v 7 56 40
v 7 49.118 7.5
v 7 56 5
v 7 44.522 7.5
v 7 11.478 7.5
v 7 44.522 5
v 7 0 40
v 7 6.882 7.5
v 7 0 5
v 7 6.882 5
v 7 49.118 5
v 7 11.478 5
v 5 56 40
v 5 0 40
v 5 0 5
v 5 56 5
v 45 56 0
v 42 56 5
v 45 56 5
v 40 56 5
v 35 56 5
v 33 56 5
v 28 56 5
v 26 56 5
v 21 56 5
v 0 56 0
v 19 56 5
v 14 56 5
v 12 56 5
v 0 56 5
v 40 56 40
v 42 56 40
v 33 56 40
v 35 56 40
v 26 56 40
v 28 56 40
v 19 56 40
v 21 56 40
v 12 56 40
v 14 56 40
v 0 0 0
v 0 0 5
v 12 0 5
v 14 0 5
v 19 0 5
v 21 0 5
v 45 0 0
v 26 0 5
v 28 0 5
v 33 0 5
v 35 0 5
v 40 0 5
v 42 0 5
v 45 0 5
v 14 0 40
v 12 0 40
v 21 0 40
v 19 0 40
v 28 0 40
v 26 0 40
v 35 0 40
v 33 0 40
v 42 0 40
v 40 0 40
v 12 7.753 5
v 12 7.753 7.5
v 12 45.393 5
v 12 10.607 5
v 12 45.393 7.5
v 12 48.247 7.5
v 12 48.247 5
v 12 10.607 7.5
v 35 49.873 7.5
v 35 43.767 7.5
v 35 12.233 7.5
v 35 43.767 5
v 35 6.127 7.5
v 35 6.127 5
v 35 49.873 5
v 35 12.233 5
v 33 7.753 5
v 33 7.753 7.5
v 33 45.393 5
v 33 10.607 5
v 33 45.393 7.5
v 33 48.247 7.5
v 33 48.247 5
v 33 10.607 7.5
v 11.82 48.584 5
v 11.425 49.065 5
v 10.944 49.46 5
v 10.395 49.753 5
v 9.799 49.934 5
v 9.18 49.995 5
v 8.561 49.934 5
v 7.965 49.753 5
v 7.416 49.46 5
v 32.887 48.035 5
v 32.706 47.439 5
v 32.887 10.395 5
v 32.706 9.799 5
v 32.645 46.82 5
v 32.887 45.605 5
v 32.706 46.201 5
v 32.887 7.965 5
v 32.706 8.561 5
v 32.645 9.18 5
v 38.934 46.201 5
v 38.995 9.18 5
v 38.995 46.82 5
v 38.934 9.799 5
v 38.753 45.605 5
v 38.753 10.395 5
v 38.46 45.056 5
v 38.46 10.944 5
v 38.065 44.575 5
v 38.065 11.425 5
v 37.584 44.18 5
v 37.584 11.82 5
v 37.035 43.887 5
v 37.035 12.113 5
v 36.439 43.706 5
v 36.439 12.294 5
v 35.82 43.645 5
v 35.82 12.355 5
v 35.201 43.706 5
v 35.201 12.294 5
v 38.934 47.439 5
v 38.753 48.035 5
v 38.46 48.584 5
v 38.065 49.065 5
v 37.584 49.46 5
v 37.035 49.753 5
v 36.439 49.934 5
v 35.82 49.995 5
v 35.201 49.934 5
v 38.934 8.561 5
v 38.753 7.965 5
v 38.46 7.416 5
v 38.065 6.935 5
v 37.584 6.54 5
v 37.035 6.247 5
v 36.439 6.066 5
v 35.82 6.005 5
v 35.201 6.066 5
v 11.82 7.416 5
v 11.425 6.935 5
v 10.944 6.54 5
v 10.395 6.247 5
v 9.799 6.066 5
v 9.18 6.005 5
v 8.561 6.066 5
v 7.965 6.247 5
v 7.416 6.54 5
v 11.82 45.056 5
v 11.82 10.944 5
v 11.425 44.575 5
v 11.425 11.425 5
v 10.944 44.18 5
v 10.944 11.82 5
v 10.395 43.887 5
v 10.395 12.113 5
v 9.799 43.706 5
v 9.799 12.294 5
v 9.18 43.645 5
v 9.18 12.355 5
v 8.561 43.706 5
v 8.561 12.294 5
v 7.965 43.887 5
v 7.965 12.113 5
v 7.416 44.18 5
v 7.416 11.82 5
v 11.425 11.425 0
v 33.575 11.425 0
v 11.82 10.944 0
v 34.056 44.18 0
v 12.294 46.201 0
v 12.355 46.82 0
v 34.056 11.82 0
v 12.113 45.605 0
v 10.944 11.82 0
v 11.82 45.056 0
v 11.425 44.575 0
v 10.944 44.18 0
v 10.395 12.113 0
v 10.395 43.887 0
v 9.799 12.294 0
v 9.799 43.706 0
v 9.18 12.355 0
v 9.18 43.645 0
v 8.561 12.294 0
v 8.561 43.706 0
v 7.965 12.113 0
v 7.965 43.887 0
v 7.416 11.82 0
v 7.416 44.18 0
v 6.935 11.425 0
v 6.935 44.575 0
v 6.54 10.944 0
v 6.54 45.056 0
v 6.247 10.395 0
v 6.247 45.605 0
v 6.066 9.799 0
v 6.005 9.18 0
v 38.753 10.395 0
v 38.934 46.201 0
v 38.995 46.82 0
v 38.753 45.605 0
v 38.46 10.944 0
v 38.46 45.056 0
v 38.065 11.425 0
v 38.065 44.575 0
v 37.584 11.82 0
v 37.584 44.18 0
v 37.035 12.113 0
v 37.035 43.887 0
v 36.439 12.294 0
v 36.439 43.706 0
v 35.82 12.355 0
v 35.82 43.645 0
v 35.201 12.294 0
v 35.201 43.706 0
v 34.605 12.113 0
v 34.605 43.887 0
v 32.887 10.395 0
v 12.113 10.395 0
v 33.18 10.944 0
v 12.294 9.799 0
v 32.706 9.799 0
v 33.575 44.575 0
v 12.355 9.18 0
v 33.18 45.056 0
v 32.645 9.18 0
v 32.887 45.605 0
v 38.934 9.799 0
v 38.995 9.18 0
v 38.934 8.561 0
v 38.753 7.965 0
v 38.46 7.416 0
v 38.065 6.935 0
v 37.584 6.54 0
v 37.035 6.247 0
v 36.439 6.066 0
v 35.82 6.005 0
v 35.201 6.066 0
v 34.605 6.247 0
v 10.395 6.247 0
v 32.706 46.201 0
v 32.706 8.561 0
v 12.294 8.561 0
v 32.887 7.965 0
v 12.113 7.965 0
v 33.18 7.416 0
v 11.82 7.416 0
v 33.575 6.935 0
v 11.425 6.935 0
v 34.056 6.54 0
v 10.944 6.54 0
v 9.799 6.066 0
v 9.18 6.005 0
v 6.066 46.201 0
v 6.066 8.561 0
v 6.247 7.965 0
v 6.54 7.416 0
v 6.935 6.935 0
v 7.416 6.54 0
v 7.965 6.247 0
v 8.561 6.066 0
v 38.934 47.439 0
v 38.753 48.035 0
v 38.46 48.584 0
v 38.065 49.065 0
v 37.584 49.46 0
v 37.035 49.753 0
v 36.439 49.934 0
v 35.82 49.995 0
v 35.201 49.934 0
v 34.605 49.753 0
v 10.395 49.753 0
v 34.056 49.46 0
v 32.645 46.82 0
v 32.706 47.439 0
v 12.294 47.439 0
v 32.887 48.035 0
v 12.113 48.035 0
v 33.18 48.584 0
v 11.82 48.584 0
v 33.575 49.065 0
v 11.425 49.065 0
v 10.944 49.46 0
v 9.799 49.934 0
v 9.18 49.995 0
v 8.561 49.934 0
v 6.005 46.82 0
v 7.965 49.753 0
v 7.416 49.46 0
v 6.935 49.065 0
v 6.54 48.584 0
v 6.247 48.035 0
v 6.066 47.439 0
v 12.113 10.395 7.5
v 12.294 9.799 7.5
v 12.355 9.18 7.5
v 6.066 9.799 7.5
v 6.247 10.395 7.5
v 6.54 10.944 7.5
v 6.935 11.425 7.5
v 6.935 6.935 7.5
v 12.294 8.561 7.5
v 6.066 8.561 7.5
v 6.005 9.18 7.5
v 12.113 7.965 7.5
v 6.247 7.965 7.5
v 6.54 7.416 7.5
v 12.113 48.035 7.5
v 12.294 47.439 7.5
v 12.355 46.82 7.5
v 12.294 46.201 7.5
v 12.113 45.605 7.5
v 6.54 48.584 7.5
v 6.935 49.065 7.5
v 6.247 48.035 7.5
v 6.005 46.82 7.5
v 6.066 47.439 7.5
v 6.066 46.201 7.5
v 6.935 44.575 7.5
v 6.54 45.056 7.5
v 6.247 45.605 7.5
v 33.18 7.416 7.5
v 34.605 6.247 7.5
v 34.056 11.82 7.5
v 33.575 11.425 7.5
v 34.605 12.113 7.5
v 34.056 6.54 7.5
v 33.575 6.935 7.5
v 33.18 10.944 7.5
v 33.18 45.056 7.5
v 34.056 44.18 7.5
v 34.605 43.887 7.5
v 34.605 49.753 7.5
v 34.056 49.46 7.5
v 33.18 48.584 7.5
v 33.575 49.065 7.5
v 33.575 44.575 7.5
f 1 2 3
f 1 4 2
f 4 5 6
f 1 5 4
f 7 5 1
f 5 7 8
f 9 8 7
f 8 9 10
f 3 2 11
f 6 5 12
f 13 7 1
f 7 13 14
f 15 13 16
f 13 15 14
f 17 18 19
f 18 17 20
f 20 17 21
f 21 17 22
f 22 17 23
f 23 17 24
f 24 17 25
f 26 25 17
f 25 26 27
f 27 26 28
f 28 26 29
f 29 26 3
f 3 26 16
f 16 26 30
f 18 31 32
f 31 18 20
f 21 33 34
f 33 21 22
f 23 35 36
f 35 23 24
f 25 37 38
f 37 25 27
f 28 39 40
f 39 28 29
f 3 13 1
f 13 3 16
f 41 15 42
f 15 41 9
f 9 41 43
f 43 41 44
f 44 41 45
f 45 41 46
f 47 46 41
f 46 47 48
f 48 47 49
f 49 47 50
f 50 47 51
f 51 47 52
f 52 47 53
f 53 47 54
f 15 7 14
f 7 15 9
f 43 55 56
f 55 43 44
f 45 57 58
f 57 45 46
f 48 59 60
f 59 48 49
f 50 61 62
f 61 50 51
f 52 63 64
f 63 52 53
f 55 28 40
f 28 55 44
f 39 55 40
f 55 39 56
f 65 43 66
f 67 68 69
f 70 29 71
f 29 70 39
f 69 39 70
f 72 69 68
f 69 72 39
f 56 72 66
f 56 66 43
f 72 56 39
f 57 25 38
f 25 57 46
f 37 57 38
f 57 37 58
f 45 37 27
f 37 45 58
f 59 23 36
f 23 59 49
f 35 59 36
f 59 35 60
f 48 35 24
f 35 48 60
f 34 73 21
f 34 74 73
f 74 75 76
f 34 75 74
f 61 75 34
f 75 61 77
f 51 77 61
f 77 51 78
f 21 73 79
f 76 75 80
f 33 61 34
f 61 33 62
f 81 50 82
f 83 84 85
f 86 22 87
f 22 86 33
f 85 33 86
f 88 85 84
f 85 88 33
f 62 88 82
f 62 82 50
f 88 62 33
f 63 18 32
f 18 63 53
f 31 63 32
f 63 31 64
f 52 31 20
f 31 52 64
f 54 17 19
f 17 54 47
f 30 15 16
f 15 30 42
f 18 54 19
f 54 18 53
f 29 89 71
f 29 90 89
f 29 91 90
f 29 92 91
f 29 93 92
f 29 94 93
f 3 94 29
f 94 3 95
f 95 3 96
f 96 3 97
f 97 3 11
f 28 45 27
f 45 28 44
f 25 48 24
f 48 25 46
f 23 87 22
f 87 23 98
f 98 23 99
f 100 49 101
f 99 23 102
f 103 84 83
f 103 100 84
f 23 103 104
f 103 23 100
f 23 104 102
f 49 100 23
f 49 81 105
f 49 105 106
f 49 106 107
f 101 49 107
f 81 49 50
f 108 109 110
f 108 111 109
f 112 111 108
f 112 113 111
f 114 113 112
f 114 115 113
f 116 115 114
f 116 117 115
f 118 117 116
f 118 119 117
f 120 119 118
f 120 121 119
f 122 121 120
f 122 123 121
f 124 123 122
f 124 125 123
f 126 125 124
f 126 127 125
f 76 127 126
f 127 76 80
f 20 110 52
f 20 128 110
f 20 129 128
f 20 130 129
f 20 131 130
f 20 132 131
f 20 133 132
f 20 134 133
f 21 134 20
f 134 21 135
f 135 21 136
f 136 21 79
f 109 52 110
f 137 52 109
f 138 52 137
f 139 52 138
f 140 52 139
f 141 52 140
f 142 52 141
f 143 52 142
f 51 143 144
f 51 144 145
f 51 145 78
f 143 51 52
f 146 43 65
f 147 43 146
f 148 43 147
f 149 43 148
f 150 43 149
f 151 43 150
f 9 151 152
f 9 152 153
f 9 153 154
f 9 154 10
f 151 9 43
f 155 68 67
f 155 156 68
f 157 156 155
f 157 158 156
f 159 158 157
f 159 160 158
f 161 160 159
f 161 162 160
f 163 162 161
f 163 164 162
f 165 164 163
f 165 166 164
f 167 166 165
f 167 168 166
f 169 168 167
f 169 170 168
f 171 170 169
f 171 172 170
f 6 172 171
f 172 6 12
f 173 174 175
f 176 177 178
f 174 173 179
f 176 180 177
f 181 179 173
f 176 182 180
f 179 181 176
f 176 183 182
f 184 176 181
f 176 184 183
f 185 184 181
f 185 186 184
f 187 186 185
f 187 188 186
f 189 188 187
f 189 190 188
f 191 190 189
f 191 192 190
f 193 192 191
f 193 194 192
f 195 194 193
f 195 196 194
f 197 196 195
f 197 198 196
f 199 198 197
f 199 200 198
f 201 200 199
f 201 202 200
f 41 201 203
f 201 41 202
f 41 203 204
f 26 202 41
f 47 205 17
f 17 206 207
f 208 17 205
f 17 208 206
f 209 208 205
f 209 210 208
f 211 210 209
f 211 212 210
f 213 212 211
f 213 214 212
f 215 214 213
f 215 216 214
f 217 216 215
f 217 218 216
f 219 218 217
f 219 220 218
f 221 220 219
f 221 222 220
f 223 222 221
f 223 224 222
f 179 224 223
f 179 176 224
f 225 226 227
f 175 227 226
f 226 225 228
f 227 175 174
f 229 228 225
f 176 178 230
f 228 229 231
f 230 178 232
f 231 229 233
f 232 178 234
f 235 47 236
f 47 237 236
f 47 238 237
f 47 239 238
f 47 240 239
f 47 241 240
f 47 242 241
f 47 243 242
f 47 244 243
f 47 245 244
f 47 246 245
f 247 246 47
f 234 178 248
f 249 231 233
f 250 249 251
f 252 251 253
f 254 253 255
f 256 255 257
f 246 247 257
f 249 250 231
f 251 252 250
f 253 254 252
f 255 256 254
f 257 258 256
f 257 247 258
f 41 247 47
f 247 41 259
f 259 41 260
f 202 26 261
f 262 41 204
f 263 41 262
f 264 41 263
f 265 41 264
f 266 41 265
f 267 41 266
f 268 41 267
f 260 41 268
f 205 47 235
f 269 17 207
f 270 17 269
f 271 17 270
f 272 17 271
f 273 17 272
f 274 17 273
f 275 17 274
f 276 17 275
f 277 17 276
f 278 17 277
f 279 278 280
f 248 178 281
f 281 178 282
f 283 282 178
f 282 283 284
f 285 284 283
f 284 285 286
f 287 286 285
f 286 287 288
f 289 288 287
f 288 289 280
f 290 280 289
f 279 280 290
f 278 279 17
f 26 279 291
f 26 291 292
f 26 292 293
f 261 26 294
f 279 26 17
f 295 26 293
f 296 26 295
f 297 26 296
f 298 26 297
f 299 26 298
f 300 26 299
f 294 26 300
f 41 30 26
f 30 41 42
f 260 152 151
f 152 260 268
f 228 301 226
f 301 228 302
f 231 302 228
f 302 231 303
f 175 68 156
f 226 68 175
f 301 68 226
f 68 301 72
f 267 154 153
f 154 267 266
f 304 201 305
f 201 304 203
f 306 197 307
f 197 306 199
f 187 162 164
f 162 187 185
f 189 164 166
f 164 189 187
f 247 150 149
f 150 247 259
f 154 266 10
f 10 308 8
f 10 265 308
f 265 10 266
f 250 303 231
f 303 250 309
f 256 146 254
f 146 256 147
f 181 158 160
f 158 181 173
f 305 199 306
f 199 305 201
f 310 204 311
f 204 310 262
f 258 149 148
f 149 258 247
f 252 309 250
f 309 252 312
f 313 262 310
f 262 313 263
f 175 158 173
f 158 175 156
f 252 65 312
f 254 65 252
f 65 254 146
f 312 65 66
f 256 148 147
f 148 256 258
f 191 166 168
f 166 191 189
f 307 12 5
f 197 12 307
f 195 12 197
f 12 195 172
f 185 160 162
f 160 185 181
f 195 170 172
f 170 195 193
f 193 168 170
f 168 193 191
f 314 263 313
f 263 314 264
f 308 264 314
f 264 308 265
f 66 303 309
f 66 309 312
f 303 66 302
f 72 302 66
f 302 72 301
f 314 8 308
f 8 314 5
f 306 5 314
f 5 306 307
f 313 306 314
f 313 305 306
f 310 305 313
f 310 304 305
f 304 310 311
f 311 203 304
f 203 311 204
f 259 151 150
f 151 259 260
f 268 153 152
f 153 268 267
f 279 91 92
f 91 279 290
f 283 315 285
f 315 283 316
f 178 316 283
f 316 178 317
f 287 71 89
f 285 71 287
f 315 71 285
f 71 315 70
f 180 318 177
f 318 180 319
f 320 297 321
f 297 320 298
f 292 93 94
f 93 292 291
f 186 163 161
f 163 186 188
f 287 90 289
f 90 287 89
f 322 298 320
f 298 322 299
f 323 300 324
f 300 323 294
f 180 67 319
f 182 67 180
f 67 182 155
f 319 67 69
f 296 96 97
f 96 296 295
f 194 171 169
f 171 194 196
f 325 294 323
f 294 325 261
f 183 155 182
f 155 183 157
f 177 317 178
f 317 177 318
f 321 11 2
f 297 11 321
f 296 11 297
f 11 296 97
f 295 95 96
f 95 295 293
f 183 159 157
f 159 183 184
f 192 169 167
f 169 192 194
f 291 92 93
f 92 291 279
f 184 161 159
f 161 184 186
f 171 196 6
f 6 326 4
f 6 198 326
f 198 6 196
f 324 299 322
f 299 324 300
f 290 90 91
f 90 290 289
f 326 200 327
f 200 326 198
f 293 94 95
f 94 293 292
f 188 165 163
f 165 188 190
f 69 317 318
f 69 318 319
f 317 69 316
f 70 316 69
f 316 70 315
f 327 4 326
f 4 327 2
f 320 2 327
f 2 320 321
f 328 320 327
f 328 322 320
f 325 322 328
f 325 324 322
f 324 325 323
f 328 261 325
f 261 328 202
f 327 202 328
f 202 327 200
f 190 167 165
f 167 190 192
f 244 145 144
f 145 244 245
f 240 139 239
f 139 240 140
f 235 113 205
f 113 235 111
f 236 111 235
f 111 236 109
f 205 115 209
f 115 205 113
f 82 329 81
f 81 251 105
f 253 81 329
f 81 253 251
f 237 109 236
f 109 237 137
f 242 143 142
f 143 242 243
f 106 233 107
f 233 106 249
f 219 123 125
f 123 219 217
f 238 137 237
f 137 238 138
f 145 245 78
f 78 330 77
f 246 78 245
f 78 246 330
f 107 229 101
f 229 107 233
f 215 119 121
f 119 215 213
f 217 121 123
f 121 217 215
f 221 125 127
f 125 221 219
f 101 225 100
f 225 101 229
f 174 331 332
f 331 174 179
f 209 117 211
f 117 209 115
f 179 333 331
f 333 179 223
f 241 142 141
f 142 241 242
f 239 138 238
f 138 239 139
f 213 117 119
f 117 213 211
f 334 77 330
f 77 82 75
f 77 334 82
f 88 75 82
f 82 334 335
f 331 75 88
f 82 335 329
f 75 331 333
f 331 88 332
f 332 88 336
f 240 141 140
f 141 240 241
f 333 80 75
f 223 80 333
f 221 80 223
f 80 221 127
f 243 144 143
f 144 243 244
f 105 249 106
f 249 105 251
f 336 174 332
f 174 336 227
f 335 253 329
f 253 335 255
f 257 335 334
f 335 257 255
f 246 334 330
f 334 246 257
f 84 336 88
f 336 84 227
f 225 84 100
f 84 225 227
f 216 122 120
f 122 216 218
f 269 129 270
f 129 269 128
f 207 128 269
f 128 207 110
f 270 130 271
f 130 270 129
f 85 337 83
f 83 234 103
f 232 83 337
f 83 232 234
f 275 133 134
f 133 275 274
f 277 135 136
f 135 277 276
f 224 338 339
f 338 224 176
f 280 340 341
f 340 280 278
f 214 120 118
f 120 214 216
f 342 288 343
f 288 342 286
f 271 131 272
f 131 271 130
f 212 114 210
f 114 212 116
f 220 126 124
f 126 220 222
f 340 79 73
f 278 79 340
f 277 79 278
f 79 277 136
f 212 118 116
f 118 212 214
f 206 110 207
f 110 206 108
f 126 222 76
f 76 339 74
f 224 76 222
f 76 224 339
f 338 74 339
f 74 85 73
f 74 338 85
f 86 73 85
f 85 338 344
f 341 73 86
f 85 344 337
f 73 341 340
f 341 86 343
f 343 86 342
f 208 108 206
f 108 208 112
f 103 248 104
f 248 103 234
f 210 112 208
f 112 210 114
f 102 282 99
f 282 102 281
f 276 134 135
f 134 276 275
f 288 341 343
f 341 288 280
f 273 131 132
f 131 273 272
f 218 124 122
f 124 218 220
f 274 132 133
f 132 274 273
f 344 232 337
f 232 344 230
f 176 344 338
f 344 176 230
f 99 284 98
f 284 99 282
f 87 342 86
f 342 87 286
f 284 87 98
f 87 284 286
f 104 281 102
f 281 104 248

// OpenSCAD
$fn = 32;

// ----------------------------------------------------------------------
// Finned heat sink: 45 x 56 mm base, 35 mm fins
// ----------------------------------------------------------------------

// --- parameters (mm) ---
base_w = 45;              // base width
base_d = 56;              // base depth
base_t = 5;               // base thickness
fin_h = 35;               // fin height above the base
holes_d = 6.35;           // fixing holes
hole_x = 13.32;           // hole offset in x
hole_y = 18.82;           // hole offset in y
fin_t = 2;                // fin thickness
fin_pitch = 7;            // fin pitch
fin_count = 6;            // number of fins
fin_x0 = 5;               // first fin offset

difference() {
  union() {
    cube([base_w, base_d, base_t]);
    for (i = [0 : fin_count - 1]) {
      translate([fin_x0 + i * fin_pitch, 0, base_t - 0.5]) cube([fin_t, base_d, fin_h + 0.5]);
    }
  }
  /* fixing holes through the base, 2.5 mm clear on both sides */
  for (hx = [-13.32, 13.32]) {
    for (hy = [-18.82, 18.82]) {
      translate([base_w / 2 + hx, base_d / 2 + hy, -2.5]) cylinder(h = base_t + 5, d = holes_d);
    }
  }
}
